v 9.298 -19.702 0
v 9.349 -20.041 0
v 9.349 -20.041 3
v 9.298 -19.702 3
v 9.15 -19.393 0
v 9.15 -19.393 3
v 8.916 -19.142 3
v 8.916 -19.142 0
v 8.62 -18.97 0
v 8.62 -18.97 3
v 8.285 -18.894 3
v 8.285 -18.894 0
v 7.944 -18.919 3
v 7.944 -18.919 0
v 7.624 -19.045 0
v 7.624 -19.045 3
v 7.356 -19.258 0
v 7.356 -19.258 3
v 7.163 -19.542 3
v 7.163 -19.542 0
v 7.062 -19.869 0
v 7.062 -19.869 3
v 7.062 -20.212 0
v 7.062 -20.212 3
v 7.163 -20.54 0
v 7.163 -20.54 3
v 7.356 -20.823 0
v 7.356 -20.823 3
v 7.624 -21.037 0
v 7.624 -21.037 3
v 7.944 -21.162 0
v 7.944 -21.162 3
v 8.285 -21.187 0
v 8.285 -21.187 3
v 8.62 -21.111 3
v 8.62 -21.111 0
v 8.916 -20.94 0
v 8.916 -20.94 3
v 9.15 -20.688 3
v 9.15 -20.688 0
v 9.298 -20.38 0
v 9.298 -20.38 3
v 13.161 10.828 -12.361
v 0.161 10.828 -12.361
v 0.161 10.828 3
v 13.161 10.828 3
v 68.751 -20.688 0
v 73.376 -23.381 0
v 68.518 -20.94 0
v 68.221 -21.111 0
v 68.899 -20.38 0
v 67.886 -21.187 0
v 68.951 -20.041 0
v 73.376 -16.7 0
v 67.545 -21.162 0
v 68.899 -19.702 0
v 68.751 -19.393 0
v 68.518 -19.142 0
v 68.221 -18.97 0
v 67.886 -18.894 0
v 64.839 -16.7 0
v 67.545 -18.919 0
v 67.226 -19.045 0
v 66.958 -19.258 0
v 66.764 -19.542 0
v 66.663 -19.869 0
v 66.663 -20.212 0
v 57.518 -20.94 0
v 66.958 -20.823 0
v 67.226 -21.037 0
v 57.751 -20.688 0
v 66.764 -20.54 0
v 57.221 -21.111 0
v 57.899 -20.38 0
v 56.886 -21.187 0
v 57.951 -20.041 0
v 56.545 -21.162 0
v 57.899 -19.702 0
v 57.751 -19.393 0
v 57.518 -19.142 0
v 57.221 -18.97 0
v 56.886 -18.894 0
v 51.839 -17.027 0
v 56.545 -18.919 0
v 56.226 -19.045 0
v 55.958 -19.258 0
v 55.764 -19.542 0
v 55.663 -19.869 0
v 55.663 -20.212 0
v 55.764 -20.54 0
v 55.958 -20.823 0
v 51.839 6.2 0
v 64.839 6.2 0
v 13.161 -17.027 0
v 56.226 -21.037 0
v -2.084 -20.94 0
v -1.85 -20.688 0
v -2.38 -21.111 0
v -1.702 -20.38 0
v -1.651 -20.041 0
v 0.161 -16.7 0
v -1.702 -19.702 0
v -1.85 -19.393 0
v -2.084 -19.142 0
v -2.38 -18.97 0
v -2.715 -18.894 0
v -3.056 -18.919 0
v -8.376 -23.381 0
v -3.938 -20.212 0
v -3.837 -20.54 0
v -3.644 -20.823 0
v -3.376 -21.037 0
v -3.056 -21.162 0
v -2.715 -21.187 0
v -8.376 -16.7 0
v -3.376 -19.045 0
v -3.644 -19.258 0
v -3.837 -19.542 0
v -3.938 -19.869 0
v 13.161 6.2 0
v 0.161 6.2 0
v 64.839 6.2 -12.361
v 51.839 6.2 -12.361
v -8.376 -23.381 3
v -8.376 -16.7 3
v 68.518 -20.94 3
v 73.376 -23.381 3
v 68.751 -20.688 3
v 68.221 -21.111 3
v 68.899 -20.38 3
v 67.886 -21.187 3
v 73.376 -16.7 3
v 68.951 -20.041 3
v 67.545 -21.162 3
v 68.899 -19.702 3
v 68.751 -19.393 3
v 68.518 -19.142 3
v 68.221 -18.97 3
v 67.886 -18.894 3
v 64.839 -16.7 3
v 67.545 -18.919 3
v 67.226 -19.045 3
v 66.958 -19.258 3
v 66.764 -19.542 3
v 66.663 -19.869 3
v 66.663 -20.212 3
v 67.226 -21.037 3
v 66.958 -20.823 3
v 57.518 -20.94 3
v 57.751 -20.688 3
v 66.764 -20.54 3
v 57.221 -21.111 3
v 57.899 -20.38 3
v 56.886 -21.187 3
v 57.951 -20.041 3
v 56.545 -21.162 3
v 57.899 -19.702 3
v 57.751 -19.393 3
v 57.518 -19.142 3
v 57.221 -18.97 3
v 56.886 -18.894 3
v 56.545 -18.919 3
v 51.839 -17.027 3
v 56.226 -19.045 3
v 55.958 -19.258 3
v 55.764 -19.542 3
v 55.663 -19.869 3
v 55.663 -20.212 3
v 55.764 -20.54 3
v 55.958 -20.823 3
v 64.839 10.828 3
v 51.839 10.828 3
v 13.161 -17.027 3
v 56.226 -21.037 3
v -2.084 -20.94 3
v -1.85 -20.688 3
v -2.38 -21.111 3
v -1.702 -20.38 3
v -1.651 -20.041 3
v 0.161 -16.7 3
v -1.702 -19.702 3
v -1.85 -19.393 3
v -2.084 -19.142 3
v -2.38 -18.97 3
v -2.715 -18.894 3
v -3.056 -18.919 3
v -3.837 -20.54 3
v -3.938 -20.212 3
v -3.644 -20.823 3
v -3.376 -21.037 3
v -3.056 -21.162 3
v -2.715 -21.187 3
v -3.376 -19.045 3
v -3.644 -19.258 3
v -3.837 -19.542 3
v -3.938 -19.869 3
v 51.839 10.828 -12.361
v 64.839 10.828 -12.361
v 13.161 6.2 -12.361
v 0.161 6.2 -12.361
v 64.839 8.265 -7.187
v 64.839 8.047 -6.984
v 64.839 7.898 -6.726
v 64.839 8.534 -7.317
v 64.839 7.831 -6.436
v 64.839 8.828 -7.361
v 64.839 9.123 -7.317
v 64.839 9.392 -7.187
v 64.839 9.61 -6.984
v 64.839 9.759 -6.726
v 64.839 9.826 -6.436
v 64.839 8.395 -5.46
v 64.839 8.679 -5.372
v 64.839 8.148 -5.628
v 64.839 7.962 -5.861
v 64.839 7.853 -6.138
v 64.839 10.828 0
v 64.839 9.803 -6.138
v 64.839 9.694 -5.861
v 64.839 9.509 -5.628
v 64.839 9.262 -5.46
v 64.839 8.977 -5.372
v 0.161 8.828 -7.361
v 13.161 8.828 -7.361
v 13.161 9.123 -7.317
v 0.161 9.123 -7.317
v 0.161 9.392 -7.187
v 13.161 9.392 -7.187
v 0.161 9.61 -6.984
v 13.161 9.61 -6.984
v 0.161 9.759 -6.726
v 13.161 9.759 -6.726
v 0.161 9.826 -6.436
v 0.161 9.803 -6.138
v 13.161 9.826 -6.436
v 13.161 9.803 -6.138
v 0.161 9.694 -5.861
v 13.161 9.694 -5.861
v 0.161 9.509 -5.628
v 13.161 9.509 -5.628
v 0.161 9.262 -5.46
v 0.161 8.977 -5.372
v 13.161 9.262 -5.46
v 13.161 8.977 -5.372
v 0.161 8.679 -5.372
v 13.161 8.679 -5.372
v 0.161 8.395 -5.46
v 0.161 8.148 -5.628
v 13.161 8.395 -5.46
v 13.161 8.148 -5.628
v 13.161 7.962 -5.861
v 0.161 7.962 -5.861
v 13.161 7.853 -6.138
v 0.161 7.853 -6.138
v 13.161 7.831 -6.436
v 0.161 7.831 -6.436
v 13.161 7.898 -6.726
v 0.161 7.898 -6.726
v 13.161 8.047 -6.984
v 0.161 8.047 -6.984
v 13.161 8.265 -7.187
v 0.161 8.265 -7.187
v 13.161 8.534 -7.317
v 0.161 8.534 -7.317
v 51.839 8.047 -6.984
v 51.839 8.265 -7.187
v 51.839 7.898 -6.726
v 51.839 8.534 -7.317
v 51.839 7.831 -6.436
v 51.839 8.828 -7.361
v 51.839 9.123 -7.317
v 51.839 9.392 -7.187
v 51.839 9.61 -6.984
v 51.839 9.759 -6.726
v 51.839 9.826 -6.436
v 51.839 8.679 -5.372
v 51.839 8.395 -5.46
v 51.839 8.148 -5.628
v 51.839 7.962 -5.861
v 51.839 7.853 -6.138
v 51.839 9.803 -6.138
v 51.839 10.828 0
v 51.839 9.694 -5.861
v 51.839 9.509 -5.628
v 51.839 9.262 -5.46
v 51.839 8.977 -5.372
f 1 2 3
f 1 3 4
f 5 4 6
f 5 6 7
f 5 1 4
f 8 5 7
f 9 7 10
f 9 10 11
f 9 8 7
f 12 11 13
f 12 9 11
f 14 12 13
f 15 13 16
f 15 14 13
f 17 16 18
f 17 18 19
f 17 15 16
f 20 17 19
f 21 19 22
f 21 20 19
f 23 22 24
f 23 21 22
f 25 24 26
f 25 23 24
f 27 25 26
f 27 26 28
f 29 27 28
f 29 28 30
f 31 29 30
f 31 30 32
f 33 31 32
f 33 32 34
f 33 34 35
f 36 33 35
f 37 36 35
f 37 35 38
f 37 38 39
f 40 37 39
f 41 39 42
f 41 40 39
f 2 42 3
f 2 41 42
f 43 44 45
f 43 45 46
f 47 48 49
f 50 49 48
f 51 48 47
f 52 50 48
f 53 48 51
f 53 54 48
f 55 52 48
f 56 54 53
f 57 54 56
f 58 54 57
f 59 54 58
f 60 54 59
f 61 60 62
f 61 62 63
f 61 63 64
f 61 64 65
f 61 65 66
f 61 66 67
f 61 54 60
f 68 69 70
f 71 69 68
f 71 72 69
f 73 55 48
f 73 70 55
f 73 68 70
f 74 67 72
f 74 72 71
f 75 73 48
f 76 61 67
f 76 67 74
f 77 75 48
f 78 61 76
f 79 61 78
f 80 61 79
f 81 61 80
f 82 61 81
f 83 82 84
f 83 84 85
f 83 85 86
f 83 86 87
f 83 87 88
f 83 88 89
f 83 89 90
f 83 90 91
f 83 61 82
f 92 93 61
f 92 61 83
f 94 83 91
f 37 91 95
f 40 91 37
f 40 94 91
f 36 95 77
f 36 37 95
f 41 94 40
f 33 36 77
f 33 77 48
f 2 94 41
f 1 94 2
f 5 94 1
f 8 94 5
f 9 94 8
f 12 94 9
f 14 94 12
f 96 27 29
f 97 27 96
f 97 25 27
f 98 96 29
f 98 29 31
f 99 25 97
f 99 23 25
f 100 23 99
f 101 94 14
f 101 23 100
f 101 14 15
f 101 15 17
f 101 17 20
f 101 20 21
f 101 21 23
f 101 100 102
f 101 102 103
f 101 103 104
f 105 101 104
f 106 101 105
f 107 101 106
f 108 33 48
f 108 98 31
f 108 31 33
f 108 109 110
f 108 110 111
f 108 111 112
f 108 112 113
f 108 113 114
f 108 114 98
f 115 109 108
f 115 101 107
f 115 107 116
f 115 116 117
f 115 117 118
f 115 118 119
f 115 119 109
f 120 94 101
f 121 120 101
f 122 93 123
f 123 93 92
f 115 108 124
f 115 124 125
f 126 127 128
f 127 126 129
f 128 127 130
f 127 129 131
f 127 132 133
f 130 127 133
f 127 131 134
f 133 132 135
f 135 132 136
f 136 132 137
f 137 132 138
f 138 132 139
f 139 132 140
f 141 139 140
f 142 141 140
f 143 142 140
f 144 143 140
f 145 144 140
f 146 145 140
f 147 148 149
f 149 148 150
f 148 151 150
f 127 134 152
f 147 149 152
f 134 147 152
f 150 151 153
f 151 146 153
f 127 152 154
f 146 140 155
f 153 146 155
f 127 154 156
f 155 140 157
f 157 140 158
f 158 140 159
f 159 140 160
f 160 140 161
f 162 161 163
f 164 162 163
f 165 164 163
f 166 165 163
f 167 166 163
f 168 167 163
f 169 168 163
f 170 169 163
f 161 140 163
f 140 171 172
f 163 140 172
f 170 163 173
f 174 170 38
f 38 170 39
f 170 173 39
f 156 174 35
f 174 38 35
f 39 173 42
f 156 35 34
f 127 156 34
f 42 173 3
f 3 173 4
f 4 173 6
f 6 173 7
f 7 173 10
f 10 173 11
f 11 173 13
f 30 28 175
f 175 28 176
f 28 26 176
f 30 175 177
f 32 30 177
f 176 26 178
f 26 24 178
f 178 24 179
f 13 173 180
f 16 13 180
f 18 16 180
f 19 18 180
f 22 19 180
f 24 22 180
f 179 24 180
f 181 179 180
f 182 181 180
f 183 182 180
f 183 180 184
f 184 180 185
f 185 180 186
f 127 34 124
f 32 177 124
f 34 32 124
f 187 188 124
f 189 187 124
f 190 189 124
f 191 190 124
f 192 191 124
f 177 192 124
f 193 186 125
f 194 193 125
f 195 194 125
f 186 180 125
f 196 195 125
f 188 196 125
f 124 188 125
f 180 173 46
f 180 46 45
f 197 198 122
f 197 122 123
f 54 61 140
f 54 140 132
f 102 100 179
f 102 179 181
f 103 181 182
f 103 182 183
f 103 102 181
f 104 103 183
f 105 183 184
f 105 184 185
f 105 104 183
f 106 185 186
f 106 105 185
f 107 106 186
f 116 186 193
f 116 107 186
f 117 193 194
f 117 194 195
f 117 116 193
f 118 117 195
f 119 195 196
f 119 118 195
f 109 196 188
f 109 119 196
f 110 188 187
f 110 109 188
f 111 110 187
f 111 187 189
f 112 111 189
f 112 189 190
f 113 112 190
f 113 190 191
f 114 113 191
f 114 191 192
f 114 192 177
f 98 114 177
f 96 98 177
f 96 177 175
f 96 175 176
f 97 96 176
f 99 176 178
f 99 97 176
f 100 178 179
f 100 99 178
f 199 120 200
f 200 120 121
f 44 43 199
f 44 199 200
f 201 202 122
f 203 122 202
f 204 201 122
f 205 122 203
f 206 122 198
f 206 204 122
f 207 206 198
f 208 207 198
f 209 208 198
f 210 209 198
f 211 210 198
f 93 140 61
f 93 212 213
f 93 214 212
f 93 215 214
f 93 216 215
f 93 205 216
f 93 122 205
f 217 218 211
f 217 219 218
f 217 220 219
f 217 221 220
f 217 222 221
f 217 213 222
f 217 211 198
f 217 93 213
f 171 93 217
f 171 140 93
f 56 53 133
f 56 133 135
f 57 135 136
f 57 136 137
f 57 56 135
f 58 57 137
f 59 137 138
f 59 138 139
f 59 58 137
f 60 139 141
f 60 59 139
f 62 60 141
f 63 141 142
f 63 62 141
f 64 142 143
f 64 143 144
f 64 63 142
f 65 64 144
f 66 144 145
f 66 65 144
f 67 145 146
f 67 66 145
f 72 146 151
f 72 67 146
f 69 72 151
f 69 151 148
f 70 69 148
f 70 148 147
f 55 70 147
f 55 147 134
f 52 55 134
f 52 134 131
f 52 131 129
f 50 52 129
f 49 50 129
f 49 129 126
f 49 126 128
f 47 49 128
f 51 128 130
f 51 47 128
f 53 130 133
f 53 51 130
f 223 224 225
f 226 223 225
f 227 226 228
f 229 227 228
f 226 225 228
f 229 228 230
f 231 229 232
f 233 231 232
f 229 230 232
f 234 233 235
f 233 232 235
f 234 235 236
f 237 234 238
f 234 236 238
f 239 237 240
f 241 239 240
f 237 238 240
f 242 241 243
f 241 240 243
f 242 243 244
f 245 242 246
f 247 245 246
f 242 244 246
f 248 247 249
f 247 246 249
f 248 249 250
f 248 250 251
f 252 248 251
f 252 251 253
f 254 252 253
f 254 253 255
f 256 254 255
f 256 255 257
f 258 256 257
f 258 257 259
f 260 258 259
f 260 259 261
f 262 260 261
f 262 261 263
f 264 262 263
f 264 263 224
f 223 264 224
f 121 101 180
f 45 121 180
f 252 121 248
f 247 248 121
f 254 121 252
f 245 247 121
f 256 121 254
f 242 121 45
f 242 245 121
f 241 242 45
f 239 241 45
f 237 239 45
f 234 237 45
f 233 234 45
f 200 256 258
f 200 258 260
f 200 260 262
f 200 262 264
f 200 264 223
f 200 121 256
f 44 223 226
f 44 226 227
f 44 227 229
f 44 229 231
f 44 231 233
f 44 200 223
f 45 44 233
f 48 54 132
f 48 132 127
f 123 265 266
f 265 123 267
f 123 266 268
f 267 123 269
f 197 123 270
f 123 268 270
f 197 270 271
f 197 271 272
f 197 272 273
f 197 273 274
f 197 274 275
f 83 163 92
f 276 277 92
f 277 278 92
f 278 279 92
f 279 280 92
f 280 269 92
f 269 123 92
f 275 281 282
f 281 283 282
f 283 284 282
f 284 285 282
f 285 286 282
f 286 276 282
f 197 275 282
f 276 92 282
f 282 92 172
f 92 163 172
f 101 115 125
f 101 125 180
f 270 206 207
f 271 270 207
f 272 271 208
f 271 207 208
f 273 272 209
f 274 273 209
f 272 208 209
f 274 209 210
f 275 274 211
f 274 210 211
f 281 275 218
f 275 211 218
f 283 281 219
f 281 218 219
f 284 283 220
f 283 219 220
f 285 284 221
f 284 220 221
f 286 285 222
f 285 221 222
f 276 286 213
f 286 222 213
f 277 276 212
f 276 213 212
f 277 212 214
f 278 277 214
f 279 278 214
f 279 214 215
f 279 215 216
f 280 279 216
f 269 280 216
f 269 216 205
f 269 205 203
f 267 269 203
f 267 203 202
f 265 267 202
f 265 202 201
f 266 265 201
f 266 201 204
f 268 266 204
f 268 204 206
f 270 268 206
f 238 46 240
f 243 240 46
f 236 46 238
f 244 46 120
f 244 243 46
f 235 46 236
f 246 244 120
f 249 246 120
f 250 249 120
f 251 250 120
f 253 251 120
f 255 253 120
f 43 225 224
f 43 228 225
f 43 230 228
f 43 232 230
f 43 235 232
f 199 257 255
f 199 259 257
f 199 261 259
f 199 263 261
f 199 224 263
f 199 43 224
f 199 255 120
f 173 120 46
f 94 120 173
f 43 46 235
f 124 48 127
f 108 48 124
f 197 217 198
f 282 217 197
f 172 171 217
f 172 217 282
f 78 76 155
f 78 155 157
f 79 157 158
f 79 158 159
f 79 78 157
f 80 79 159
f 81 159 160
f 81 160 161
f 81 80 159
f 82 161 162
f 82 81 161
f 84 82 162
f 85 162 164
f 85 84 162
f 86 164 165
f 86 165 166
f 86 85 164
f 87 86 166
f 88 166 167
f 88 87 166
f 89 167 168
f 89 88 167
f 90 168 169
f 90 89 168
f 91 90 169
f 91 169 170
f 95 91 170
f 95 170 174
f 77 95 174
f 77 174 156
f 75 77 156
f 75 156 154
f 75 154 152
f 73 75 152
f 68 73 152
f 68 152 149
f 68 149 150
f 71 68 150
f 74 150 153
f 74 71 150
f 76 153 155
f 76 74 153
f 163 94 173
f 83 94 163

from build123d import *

# Parameters (mm, degrees)
SKETCH_1_R          = 1.149999389
SKETCH_1_R_2        = 1.149999553
SKETCH_1_R_3        = 1.149999359
SKETCH_1_R_4        = 1.149997552
EXTRUDE_1_DEPTH     = 3
SKETCH_4_W          = 12.999996185
SKETCH_4_H          = 4.628
SKETCH_4_W_2        = 13.000000328
EXTRUDE_2_DEPTH     = 12.361
SKETCH_6_R          = 1
CUT_EXTRUDE_2_DEPTH = 200


with BuildPart() as part:
    # 草图1 → 凸台-拉伸1 (new body)
    with BuildSketch(Plane.XY):
        Polygon((13.161137581, 10.828393936), (13.161137581, -17.026895523), (51.838863373, -17.026895523), (51.838863373, 10.828393936), (64.838859558, 10.828393936), (64.838859558, -16.700000763), (73.376037598, -16.700000763), (73.376037598, -23.38126564), (-8.376040459, -23.38126564), (-8.376040459, -16.700000763), (0.161137253, -16.700000763), (0.161137253, 10.828393936), align=None)
        with Locations((-2.800555034, -20.040632255)):
            Circle(SKETCH_1_R, mode=Mode.SUBTRACT)
        with Locations((8.199444431, -20.040632183)):
            Circle(SKETCH_1_R_2, mode=Mode.SUBTRACT)
        with Locations((56.800554471, -20.040632944)):
            Circle(SKETCH_1_R_3, mode=Mode.SUBTRACT)
        with Locations((67.800554915, -20.040625058)):
            Circle(SKETCH_1_R_4, mode=Mode.SUBTRACT)
    extrude(amount=EXTRUDE_1_DEPTH)

    # 草图4 → 凸台-拉伸2 (add)
    with BuildSketch(Plane(origin=(0, 0, 0), x_dir=(-1, 0, 0), z_dir=(0, 0, -1))):
        with Locations((-58.338861466, 8.514393936)):
            Rectangle(SKETCH_4_W, SKETCH_4_H)
        with Locations((-6.661137417, 8.514393936)):
            Rectangle(SKETCH_4_W_2, SKETCH_4_H)
    extrude(amount=EXTRUDE_2_DEPTH)

    # 草图6 → 切除-拉伸2 (cut)
    with BuildSketch(Plane(origin=(64.838859558, 0, 0), x_dir=(0, 0, -1), z_dir=(1, 0, 0))):
        with Locations((6.361, 8.828393936)):
            Circle(SKETCH_6_R)
    extrude(amount=-CUT_EXTRUDE_2_DEPTH, mode=Mode.SUBTRACT)


solid = part.part
